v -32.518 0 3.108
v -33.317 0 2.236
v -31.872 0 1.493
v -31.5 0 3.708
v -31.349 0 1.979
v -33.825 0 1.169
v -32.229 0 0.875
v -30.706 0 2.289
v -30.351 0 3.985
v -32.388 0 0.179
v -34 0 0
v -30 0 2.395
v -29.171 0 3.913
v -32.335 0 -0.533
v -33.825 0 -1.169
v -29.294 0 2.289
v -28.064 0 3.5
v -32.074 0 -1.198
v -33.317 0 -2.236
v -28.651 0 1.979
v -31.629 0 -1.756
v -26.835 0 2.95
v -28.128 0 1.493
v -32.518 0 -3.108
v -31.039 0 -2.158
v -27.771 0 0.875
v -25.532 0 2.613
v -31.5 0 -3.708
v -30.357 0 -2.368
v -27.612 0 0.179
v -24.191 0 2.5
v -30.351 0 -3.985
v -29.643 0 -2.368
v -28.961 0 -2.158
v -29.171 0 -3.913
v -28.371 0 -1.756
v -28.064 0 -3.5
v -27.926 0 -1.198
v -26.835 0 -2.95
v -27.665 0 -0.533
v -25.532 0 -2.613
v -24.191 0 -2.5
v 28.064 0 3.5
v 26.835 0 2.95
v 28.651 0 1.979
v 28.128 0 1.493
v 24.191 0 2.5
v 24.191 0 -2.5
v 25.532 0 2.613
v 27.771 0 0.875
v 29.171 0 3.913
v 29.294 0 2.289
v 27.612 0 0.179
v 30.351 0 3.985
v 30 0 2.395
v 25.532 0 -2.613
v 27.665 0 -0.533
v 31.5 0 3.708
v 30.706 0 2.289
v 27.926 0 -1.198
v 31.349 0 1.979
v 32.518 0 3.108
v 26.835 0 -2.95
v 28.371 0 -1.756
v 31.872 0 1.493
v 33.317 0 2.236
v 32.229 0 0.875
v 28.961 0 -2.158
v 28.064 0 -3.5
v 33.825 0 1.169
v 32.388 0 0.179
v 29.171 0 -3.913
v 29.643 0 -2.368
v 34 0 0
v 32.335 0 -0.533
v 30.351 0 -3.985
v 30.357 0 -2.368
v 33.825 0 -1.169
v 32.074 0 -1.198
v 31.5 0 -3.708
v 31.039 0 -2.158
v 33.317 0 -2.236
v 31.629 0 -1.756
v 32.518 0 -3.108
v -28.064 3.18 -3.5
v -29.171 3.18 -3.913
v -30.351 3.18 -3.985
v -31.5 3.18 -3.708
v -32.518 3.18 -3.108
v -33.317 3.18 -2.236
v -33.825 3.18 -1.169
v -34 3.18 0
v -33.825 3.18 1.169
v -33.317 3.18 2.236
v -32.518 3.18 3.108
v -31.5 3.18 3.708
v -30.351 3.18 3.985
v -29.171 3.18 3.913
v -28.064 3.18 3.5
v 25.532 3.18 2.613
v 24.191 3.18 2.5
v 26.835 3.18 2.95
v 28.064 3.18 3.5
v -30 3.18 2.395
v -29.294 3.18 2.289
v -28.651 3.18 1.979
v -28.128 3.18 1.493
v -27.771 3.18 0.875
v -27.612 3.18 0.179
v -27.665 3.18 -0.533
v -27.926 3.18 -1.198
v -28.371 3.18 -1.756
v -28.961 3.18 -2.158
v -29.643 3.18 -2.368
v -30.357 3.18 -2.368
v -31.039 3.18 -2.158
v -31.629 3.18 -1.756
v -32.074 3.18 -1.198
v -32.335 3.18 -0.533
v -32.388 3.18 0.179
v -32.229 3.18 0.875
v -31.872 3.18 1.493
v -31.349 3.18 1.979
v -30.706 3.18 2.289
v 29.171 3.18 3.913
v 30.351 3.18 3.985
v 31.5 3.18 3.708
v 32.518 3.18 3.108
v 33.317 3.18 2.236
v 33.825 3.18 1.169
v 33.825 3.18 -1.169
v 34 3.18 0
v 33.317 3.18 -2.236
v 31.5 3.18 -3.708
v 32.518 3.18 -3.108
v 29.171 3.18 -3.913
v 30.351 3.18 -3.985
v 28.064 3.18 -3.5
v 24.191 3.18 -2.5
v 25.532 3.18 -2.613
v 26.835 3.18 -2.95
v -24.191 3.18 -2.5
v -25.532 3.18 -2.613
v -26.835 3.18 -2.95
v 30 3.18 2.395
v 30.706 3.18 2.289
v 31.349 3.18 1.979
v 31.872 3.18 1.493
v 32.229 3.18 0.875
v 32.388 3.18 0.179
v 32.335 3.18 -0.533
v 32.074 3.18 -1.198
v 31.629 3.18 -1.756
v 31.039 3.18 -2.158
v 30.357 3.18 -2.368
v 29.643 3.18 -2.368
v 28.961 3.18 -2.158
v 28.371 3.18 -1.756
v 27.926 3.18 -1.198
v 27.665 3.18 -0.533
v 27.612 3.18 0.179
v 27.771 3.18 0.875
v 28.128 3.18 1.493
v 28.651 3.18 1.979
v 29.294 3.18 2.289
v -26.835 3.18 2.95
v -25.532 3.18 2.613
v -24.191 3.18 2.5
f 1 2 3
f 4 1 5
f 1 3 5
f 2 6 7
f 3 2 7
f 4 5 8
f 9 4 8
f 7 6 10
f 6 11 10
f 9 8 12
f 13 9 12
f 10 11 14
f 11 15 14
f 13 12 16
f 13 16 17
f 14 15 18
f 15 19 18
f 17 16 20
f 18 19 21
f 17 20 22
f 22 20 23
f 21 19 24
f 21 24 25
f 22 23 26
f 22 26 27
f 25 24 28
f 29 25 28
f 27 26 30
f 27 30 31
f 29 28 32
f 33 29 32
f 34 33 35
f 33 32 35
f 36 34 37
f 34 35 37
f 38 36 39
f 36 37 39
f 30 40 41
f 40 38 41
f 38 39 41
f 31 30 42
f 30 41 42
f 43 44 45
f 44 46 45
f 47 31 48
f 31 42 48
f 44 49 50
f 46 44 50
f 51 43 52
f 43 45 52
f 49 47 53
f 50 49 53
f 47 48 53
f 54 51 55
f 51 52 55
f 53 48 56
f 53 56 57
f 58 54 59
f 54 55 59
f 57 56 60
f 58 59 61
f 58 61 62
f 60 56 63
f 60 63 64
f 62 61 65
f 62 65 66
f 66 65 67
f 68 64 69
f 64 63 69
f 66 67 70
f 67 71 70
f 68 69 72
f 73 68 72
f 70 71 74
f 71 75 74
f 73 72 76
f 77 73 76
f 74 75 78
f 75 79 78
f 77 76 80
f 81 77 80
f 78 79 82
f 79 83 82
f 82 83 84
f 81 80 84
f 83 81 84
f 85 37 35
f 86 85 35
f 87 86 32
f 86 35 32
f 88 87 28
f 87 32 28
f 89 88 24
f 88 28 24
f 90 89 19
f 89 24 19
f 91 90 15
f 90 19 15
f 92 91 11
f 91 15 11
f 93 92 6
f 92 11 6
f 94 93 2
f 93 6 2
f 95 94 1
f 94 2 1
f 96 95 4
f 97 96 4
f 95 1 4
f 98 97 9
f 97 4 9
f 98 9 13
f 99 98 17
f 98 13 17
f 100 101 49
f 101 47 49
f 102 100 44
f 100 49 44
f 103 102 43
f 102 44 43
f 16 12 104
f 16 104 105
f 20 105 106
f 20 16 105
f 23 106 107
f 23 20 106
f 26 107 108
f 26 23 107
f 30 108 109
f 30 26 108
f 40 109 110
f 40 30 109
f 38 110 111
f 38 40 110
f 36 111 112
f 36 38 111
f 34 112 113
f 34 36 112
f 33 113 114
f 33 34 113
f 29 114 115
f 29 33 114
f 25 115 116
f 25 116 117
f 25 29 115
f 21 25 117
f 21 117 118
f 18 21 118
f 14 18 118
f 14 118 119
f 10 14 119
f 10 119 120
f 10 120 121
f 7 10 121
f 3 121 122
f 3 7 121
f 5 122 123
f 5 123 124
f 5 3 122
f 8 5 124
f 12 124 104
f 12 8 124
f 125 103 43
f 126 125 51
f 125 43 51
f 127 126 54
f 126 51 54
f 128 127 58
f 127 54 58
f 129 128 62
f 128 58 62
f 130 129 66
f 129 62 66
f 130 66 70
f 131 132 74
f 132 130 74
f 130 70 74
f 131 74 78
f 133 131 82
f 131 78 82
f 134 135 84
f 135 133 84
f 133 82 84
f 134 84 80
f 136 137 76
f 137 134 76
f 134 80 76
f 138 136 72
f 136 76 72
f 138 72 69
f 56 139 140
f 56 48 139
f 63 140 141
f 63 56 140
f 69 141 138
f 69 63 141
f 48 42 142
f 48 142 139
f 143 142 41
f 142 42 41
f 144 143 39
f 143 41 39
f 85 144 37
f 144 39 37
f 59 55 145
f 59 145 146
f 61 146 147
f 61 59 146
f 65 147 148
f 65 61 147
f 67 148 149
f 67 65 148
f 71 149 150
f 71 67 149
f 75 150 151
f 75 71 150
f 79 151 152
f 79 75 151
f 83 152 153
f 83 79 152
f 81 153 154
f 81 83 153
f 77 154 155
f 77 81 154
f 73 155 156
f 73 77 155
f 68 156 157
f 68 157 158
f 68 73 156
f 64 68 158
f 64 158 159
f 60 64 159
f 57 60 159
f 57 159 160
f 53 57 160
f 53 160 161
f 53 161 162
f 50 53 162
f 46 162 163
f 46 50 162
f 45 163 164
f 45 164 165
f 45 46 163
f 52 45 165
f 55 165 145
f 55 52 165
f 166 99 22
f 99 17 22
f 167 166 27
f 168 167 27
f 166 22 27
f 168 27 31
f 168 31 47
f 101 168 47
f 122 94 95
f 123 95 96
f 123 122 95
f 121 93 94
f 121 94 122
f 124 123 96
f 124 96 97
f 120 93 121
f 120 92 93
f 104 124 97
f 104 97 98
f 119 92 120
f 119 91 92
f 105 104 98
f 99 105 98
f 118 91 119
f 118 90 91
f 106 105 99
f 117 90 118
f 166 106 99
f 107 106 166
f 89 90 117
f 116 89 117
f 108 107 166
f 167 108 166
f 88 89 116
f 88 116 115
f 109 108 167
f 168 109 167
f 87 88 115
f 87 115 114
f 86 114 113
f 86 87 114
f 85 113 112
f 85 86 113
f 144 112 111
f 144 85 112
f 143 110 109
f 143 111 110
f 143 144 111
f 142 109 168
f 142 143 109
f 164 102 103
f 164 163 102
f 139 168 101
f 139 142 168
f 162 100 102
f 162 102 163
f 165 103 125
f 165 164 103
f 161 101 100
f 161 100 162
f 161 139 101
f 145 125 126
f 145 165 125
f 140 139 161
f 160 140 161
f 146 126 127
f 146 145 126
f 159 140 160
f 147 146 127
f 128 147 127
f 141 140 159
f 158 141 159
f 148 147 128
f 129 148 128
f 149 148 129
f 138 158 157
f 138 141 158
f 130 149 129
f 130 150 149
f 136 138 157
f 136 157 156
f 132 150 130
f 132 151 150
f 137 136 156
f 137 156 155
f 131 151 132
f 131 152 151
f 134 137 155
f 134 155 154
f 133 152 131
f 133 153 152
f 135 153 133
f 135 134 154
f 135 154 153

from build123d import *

# Parameters (mm, degrees)
SKETCH_1_W          = 60
SKETCH_1_H          = 5
EXTRUDE_1_DEPTH     = 3.18
SKETCH_2_R          = 4
EXTRUDE_2_DEPTH     = 3.18
SKETCH_3_R          = 2.395
CUT_EXTRUDE_1_DEPTH = 3.18
FILLET_3_R          = 8
FILLET_4_R          = 8
FILLET_5_R          = 8


with BuildPart() as part:
    # 草图1 → 凸台-拉伸1 (new body)
    with BuildSketch(Plane(origin=(0, 0, 0), x_dir=(1, 0, 0), z_dir=(0, 1, 0))):
        Rectangle(SKETCH_1_W, SKETCH_1_H)
    extrude(amount=EXTRUDE_1_DEPTH)

    # 草图2 → 凸台-拉伸2 (add)
    with BuildSketch(Plane(origin=(0, 0, 0), x_dir=(1, 0, 0), z_dir=(0, 1, 0))):
        with Locations((30, 0)):
            Circle(SKETCH_2_R)
        with Locations((-30, 0)):
            Circle(SKETCH_2_R)
    extrude(amount=EXTRUDE_2_DEPTH)

    # 草图3 → 切除-拉伸1 (cut)
    with BuildSketch(Plane(origin=(0, 0, 0), x_dir=(1, 0, 0), z_dir=(0, 1, 0))):
        with Locations(Location((30, 0, 0), (0, 0, 270))):
            Circle(SKETCH_3_R)
        with Locations(Location((-30, 0, 0), (0, 0, 270))):
            Circle(SKETCH_3_R)
    extrude(amount=CUT_EXTRUDE_1_DEPTH, mode=Mode.SUBTRACT)

    # 圆角3
    fillet_3_edges = [part.edges().sort_by_distance(p)[0] for p in [
        (-26.877501001, 1.59, -2.5),
    ]]
    fillet(fillet_3_edges, radius=FILLET_3_R)

    # 圆角4
    fillet_4_edges = [part.edges().sort_by_distance(p)[0] for p in [
        (-26.877501001, 1.59, 2.5),
    ]]
    fillet(fillet_4_edges, radius=FILLET_4_R)

    # 圆角5
    fillet_5_edges = [part.edges().sort_by_distance(p)[0] for p in [
        (26.877501001, 1.59, -2.5),
        (26.877501001, 1.59, 2.5),
    ]]
    fillet(fillet_5_edges, radius=FILLET_5_R)


solid = part.part
